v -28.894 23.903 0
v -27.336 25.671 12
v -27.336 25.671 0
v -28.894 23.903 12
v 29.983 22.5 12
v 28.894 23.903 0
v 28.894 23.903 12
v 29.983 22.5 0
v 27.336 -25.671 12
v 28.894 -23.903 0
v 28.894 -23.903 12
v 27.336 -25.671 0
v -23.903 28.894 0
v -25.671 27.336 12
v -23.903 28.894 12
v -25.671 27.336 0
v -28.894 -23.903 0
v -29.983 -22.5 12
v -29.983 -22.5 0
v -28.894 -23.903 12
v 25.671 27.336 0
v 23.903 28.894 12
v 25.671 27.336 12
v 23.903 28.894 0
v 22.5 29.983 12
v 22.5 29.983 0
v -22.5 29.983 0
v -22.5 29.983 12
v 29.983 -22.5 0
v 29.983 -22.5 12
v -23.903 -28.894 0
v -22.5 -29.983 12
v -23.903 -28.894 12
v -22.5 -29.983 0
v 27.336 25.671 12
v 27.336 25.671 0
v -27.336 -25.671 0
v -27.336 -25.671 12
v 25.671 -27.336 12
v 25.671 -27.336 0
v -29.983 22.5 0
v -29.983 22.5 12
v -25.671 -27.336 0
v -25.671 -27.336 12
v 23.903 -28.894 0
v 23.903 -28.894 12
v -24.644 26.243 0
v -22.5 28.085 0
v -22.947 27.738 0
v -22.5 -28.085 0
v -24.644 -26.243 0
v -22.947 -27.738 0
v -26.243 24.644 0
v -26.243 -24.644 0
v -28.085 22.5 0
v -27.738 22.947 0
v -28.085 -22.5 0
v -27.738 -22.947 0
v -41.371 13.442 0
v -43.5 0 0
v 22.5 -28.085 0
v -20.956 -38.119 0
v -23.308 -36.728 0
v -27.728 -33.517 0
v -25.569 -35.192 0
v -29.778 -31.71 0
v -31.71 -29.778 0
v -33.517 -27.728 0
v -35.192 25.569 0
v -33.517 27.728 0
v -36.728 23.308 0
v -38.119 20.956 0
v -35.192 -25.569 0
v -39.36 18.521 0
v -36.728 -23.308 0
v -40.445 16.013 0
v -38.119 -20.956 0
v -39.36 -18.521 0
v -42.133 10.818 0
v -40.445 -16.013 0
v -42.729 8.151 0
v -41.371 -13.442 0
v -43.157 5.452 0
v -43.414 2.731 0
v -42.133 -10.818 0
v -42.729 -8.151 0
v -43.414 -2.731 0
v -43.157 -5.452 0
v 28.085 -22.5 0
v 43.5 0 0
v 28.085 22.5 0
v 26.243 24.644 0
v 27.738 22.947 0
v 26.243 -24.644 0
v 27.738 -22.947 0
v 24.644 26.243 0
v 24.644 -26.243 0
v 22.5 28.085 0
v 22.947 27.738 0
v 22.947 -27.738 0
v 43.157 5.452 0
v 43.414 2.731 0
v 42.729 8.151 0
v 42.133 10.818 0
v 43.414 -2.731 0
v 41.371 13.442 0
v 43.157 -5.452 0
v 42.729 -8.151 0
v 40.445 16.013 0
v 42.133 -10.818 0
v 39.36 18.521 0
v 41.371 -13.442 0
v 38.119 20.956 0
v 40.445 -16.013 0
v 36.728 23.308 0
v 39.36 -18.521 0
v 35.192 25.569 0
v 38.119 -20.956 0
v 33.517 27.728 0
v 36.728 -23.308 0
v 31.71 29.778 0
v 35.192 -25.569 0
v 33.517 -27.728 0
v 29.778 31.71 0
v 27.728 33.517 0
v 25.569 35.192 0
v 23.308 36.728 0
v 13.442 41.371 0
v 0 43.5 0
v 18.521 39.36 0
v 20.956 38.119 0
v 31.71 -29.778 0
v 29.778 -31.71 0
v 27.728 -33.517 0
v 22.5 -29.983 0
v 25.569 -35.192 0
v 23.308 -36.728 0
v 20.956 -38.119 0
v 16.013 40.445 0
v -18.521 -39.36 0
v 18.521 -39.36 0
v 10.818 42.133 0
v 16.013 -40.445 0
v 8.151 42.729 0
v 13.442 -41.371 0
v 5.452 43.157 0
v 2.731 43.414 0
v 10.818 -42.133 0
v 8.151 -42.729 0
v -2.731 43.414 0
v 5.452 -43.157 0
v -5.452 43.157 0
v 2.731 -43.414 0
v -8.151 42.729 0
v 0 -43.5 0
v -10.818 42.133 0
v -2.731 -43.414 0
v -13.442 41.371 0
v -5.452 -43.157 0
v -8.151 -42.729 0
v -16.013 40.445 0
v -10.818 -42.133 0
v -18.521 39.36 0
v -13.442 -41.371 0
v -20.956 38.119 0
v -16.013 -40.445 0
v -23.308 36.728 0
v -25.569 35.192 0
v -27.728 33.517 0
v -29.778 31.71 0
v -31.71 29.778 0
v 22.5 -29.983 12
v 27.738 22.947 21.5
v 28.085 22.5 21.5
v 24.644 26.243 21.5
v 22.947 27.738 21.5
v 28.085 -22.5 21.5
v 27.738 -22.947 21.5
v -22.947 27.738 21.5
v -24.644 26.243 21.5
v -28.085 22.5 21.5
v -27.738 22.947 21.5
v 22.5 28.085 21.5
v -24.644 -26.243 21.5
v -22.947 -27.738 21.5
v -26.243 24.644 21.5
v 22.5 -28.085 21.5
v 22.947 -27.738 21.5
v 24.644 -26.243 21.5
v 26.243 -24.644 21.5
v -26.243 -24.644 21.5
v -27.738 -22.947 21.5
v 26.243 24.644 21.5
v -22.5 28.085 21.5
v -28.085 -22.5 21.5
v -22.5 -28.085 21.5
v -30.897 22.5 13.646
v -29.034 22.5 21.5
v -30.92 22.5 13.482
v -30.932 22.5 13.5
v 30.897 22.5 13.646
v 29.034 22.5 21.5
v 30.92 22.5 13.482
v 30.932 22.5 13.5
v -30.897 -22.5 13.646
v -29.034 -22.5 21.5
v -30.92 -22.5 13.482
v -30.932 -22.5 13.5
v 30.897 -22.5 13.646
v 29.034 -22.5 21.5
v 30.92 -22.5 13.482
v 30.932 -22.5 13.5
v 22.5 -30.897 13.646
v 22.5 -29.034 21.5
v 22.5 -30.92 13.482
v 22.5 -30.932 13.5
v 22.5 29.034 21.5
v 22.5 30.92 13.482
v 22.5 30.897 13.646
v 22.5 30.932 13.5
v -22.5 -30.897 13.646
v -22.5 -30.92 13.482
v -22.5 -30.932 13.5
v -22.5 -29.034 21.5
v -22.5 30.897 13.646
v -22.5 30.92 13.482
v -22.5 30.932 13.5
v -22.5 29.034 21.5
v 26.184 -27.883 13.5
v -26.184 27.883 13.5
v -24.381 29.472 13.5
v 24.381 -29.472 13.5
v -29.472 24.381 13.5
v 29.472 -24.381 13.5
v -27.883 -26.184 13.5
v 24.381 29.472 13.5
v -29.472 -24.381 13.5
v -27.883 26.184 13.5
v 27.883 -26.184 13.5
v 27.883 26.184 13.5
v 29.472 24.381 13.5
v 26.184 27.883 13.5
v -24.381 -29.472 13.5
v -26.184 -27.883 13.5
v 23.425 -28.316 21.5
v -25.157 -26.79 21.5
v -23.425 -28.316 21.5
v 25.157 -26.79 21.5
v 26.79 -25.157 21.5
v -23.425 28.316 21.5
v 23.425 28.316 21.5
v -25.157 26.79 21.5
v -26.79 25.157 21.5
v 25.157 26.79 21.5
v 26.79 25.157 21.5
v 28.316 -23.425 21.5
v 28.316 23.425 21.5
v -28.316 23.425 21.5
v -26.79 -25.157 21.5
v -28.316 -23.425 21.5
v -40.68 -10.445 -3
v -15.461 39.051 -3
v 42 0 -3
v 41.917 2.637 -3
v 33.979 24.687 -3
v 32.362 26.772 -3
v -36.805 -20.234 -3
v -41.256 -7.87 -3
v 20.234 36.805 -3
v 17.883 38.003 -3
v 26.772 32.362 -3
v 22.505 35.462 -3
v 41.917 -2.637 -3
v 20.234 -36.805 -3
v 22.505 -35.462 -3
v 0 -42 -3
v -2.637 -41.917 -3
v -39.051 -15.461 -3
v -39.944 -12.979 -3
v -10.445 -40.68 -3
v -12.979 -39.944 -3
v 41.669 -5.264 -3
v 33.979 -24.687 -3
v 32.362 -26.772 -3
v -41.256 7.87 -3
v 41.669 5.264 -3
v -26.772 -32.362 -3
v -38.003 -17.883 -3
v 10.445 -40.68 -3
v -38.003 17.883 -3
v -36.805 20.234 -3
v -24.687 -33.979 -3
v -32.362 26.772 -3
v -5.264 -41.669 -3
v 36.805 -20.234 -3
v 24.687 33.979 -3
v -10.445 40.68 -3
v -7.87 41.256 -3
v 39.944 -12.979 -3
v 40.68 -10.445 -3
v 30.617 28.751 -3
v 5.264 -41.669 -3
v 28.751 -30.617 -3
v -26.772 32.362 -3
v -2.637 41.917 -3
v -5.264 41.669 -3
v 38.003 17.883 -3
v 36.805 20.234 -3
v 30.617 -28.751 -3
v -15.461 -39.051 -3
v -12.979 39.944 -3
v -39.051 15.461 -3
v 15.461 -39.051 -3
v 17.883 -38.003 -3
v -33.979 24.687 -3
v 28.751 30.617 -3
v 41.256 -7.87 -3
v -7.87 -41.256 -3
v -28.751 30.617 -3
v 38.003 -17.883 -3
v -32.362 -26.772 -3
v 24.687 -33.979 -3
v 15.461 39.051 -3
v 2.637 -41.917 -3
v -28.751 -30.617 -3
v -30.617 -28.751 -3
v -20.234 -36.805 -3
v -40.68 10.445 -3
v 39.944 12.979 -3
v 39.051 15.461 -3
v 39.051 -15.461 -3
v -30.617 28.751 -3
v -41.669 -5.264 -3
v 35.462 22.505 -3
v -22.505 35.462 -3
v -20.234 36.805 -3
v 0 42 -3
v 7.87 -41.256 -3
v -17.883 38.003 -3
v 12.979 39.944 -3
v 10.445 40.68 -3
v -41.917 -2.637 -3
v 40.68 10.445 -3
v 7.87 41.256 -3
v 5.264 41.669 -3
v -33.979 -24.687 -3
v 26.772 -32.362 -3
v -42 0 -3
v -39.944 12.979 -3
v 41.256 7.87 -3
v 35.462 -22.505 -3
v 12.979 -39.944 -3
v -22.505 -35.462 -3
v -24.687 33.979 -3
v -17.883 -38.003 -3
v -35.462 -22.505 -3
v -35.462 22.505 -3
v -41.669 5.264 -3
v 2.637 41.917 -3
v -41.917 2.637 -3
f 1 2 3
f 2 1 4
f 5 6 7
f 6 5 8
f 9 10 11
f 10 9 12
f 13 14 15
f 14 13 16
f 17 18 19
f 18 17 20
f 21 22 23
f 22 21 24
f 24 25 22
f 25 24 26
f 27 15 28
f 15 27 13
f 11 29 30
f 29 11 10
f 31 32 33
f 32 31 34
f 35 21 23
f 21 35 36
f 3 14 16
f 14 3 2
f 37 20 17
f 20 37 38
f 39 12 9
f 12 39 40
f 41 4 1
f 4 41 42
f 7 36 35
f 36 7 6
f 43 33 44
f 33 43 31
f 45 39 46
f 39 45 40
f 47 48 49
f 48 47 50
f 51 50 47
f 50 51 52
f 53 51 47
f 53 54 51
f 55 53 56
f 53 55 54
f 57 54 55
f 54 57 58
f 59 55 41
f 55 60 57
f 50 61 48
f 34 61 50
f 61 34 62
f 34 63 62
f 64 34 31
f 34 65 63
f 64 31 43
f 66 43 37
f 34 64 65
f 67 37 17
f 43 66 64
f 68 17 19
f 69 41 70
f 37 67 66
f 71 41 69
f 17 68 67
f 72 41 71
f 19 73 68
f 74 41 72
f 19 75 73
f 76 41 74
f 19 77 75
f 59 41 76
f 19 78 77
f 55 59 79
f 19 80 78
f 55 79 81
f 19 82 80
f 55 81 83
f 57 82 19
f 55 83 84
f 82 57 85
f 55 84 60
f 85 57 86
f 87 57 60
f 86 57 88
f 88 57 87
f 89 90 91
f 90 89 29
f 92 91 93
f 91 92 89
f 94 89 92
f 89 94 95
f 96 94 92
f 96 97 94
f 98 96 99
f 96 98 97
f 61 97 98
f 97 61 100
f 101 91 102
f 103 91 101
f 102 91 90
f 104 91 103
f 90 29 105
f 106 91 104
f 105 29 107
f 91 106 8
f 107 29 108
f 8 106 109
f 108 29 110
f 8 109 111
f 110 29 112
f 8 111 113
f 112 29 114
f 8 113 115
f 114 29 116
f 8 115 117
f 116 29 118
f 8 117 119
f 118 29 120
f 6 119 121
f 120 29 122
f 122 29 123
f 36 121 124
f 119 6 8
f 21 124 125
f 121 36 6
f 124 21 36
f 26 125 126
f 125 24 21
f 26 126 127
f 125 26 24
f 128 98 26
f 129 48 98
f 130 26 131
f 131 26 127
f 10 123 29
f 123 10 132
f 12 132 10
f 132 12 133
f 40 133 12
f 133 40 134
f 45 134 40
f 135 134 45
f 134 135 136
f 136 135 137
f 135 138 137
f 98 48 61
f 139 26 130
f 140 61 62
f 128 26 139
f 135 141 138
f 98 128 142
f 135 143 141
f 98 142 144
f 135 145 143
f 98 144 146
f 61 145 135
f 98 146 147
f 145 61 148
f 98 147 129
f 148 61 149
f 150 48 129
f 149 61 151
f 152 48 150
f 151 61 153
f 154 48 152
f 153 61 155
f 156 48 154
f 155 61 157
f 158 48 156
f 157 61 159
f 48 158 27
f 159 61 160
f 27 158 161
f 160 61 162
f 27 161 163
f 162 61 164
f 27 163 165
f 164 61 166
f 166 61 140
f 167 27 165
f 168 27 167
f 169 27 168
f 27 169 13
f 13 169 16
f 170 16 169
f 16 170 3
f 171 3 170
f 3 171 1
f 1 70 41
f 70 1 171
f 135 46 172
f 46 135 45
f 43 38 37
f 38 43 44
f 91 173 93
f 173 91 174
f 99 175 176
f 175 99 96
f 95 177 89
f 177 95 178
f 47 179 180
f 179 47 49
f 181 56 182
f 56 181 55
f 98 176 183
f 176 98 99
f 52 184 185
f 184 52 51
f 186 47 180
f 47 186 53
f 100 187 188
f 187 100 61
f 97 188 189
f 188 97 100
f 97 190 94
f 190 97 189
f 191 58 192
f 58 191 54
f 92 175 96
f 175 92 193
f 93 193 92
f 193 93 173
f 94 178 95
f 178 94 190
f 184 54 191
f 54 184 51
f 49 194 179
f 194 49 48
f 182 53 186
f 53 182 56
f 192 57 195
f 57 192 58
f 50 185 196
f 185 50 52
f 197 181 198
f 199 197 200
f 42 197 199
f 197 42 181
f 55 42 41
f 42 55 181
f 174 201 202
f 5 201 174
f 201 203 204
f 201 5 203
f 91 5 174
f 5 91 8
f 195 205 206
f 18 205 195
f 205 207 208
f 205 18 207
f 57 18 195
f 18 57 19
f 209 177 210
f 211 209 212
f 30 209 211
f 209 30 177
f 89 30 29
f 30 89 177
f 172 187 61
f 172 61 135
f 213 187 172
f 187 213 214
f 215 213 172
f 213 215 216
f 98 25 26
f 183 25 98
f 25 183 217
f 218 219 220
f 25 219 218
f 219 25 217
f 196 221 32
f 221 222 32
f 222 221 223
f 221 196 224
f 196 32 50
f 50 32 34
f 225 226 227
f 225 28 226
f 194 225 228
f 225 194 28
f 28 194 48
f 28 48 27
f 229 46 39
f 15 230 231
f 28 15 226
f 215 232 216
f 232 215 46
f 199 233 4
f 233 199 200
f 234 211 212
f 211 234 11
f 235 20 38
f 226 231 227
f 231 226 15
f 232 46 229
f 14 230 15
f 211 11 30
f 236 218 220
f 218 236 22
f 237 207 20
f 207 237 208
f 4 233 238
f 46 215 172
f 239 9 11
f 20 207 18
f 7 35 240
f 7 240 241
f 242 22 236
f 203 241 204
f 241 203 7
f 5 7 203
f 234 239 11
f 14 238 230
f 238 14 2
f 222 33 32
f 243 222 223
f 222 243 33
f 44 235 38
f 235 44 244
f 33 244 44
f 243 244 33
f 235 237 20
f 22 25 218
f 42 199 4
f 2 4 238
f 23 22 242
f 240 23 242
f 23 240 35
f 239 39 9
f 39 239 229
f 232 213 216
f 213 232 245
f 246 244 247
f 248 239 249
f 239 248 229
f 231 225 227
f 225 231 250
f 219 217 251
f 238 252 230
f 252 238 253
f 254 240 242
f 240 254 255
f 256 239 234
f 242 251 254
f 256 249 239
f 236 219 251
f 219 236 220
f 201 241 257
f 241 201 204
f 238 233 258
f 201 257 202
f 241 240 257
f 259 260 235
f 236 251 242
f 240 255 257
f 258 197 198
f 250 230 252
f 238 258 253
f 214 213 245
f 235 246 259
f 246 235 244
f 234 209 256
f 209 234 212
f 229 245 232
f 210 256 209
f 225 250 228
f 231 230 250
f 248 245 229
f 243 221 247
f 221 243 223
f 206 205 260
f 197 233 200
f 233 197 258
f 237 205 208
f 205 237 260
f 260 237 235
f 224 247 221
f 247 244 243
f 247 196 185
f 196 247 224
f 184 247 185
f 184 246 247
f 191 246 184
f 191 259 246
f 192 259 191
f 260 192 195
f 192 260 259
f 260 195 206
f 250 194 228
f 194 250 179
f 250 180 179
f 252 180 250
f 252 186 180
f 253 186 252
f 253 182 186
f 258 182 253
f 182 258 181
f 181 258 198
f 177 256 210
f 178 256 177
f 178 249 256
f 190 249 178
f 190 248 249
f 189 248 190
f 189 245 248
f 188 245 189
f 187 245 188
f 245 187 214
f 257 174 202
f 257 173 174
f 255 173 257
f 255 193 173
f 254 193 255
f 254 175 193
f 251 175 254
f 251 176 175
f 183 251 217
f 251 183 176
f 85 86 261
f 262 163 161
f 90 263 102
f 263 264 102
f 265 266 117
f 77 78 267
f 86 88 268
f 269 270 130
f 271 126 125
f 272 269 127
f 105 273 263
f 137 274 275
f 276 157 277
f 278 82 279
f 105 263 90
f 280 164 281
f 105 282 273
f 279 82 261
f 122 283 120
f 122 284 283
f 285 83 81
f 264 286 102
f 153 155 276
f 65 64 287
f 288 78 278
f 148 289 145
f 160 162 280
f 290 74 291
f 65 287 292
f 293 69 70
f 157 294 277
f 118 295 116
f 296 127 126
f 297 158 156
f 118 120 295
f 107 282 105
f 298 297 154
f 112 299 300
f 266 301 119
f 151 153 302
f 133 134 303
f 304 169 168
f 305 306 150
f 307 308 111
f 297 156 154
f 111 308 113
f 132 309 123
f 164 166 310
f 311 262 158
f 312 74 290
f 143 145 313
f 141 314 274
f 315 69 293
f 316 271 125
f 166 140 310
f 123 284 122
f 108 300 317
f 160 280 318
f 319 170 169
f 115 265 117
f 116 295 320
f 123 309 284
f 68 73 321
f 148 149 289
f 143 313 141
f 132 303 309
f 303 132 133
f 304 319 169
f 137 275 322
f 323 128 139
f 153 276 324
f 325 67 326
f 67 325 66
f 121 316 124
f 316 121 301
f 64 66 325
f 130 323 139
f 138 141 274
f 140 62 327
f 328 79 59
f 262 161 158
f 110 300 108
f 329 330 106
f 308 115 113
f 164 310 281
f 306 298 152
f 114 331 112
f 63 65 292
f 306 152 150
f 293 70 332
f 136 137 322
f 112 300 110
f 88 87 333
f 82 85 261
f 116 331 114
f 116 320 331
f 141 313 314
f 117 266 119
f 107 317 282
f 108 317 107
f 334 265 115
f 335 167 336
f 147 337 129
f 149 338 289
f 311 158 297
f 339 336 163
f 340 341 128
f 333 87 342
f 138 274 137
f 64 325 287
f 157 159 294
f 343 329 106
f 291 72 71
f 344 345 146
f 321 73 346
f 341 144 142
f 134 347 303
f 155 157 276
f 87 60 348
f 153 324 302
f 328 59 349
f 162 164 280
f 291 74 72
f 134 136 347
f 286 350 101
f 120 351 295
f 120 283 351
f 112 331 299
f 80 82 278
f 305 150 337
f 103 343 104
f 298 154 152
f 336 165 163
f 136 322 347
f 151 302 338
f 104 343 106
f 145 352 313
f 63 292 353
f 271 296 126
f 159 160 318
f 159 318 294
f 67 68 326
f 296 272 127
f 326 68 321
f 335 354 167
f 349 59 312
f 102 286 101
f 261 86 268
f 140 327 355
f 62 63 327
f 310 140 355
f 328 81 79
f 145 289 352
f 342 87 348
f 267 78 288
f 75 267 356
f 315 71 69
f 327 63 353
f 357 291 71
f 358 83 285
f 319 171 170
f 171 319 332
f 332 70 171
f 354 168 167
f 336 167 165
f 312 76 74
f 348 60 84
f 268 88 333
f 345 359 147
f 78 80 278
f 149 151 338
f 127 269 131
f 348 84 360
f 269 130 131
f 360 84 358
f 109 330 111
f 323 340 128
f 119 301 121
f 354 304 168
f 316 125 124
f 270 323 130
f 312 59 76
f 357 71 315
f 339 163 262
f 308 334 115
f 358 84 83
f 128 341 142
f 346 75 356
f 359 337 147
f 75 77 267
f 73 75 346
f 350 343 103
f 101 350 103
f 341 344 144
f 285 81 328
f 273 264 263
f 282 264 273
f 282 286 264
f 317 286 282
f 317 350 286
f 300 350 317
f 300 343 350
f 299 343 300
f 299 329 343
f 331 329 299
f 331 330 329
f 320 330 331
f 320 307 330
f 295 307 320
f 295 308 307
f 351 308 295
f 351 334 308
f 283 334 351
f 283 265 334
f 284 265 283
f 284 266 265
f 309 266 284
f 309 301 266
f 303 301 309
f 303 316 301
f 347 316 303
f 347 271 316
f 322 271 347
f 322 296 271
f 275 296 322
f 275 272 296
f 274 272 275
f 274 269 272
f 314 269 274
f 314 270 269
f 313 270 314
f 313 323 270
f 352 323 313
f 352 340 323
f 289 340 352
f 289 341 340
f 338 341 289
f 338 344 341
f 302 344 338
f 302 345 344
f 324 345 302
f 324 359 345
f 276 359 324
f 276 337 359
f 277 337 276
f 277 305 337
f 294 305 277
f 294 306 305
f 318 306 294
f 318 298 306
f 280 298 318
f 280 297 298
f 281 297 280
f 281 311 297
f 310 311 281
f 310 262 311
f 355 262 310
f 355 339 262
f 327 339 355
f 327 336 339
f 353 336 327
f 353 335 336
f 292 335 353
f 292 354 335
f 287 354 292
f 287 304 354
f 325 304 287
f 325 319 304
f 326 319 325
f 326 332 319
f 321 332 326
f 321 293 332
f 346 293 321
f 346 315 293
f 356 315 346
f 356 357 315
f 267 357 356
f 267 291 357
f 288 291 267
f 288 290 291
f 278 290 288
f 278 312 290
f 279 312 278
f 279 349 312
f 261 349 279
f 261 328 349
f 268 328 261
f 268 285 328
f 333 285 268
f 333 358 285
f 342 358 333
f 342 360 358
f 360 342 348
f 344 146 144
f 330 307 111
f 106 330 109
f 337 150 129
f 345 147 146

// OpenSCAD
//Ceiling blind hole cover
//LGI v1.0, Dec 2016

$fn=100;

//Constants:
blindhole=75; //Diameter of the blind hole to cover
holedepth=12; //Depth of the hole, equals the length of the stands without the hook
thwall=1.5; //Wall thickness for the stands
hbottofhook=thwall; //Height of the widening section of the hook
overlap=6; //mm overlap over the hole
coverh=3; //Height (thickness) of the coverplate

//The actual coverplate (the easy part;-):
cover=blindhole+(2*overlap); //defines the diameter of the coverplate
translate(v=[0,0,(coverh/-1)]) {
cylinder (coverh,d1=cover-coverh,d2=cover);
}

//The four stands:
difference() {
cylinder (holedepth,d1=blindhole,d2=blindhole);
    
cylinder (holedepth,d1=blindhole-(2*thwall),d2=blindhole-(2*thwall));

translate (v=[(blindhole/-2),(blindhole*-0.3),0]) {
cube ([blindhole,(blindhole*0.6),holedepth]);
    }
translate (v=[(blindhole*-0.3),(blindhole/-2),0]) {
cube ([(blindhole*0.6),blindhole,holedepth]);
    }
}


//Clamping hooks lower section:
difference () {
translate(v=[0,0,holedepth]) {
cylinder (hbottofhook,d1=blindhole,d2=blindhole+(1*thwall));
    }
translate (v=[cover/-2,(blindhole*-0.3),holedepth]) {
cube ([cover,(blindhole*0.6),holedepth]);
    }
translate (v=[(blindhole*-0.3),cover/-2,holedepth]) {
cube ([(blindhole*0.6),cover,holedepth]);
    }
translate (v=[0,0,holedepth]) {
cylinder (holedepth,d1=blindhole-(2*thwall),d2=blindhole-(2*thwall));
    }
}

//Clamping hooks upper section:
htopofhook=holedepth+hbottofhook; //Do not modify
difference () {
translate(v=[0,0,htopofhook]) {
cylinder (holedepth*2/3,d1=blindhole+(1*thwall),d2=blindhole-thwall);
    }
translate (v=[cover/-2,(blindhole*-0.3),htopofhook]) {
cube ([cover,(blindhole*0.6),holedepth]);
    }
translate (v=[(blindhole*-0.3),cover/-2,htopofhook]) {
cube ([(blindhole*0.6),cover,holedepth]);
    }
translate (v=[0,0,htopofhook]) {
cylinder (holedepth*2/3,d1=blindhole-(2*thwall),d2=blindhole-(2*thwall));
    }
}
